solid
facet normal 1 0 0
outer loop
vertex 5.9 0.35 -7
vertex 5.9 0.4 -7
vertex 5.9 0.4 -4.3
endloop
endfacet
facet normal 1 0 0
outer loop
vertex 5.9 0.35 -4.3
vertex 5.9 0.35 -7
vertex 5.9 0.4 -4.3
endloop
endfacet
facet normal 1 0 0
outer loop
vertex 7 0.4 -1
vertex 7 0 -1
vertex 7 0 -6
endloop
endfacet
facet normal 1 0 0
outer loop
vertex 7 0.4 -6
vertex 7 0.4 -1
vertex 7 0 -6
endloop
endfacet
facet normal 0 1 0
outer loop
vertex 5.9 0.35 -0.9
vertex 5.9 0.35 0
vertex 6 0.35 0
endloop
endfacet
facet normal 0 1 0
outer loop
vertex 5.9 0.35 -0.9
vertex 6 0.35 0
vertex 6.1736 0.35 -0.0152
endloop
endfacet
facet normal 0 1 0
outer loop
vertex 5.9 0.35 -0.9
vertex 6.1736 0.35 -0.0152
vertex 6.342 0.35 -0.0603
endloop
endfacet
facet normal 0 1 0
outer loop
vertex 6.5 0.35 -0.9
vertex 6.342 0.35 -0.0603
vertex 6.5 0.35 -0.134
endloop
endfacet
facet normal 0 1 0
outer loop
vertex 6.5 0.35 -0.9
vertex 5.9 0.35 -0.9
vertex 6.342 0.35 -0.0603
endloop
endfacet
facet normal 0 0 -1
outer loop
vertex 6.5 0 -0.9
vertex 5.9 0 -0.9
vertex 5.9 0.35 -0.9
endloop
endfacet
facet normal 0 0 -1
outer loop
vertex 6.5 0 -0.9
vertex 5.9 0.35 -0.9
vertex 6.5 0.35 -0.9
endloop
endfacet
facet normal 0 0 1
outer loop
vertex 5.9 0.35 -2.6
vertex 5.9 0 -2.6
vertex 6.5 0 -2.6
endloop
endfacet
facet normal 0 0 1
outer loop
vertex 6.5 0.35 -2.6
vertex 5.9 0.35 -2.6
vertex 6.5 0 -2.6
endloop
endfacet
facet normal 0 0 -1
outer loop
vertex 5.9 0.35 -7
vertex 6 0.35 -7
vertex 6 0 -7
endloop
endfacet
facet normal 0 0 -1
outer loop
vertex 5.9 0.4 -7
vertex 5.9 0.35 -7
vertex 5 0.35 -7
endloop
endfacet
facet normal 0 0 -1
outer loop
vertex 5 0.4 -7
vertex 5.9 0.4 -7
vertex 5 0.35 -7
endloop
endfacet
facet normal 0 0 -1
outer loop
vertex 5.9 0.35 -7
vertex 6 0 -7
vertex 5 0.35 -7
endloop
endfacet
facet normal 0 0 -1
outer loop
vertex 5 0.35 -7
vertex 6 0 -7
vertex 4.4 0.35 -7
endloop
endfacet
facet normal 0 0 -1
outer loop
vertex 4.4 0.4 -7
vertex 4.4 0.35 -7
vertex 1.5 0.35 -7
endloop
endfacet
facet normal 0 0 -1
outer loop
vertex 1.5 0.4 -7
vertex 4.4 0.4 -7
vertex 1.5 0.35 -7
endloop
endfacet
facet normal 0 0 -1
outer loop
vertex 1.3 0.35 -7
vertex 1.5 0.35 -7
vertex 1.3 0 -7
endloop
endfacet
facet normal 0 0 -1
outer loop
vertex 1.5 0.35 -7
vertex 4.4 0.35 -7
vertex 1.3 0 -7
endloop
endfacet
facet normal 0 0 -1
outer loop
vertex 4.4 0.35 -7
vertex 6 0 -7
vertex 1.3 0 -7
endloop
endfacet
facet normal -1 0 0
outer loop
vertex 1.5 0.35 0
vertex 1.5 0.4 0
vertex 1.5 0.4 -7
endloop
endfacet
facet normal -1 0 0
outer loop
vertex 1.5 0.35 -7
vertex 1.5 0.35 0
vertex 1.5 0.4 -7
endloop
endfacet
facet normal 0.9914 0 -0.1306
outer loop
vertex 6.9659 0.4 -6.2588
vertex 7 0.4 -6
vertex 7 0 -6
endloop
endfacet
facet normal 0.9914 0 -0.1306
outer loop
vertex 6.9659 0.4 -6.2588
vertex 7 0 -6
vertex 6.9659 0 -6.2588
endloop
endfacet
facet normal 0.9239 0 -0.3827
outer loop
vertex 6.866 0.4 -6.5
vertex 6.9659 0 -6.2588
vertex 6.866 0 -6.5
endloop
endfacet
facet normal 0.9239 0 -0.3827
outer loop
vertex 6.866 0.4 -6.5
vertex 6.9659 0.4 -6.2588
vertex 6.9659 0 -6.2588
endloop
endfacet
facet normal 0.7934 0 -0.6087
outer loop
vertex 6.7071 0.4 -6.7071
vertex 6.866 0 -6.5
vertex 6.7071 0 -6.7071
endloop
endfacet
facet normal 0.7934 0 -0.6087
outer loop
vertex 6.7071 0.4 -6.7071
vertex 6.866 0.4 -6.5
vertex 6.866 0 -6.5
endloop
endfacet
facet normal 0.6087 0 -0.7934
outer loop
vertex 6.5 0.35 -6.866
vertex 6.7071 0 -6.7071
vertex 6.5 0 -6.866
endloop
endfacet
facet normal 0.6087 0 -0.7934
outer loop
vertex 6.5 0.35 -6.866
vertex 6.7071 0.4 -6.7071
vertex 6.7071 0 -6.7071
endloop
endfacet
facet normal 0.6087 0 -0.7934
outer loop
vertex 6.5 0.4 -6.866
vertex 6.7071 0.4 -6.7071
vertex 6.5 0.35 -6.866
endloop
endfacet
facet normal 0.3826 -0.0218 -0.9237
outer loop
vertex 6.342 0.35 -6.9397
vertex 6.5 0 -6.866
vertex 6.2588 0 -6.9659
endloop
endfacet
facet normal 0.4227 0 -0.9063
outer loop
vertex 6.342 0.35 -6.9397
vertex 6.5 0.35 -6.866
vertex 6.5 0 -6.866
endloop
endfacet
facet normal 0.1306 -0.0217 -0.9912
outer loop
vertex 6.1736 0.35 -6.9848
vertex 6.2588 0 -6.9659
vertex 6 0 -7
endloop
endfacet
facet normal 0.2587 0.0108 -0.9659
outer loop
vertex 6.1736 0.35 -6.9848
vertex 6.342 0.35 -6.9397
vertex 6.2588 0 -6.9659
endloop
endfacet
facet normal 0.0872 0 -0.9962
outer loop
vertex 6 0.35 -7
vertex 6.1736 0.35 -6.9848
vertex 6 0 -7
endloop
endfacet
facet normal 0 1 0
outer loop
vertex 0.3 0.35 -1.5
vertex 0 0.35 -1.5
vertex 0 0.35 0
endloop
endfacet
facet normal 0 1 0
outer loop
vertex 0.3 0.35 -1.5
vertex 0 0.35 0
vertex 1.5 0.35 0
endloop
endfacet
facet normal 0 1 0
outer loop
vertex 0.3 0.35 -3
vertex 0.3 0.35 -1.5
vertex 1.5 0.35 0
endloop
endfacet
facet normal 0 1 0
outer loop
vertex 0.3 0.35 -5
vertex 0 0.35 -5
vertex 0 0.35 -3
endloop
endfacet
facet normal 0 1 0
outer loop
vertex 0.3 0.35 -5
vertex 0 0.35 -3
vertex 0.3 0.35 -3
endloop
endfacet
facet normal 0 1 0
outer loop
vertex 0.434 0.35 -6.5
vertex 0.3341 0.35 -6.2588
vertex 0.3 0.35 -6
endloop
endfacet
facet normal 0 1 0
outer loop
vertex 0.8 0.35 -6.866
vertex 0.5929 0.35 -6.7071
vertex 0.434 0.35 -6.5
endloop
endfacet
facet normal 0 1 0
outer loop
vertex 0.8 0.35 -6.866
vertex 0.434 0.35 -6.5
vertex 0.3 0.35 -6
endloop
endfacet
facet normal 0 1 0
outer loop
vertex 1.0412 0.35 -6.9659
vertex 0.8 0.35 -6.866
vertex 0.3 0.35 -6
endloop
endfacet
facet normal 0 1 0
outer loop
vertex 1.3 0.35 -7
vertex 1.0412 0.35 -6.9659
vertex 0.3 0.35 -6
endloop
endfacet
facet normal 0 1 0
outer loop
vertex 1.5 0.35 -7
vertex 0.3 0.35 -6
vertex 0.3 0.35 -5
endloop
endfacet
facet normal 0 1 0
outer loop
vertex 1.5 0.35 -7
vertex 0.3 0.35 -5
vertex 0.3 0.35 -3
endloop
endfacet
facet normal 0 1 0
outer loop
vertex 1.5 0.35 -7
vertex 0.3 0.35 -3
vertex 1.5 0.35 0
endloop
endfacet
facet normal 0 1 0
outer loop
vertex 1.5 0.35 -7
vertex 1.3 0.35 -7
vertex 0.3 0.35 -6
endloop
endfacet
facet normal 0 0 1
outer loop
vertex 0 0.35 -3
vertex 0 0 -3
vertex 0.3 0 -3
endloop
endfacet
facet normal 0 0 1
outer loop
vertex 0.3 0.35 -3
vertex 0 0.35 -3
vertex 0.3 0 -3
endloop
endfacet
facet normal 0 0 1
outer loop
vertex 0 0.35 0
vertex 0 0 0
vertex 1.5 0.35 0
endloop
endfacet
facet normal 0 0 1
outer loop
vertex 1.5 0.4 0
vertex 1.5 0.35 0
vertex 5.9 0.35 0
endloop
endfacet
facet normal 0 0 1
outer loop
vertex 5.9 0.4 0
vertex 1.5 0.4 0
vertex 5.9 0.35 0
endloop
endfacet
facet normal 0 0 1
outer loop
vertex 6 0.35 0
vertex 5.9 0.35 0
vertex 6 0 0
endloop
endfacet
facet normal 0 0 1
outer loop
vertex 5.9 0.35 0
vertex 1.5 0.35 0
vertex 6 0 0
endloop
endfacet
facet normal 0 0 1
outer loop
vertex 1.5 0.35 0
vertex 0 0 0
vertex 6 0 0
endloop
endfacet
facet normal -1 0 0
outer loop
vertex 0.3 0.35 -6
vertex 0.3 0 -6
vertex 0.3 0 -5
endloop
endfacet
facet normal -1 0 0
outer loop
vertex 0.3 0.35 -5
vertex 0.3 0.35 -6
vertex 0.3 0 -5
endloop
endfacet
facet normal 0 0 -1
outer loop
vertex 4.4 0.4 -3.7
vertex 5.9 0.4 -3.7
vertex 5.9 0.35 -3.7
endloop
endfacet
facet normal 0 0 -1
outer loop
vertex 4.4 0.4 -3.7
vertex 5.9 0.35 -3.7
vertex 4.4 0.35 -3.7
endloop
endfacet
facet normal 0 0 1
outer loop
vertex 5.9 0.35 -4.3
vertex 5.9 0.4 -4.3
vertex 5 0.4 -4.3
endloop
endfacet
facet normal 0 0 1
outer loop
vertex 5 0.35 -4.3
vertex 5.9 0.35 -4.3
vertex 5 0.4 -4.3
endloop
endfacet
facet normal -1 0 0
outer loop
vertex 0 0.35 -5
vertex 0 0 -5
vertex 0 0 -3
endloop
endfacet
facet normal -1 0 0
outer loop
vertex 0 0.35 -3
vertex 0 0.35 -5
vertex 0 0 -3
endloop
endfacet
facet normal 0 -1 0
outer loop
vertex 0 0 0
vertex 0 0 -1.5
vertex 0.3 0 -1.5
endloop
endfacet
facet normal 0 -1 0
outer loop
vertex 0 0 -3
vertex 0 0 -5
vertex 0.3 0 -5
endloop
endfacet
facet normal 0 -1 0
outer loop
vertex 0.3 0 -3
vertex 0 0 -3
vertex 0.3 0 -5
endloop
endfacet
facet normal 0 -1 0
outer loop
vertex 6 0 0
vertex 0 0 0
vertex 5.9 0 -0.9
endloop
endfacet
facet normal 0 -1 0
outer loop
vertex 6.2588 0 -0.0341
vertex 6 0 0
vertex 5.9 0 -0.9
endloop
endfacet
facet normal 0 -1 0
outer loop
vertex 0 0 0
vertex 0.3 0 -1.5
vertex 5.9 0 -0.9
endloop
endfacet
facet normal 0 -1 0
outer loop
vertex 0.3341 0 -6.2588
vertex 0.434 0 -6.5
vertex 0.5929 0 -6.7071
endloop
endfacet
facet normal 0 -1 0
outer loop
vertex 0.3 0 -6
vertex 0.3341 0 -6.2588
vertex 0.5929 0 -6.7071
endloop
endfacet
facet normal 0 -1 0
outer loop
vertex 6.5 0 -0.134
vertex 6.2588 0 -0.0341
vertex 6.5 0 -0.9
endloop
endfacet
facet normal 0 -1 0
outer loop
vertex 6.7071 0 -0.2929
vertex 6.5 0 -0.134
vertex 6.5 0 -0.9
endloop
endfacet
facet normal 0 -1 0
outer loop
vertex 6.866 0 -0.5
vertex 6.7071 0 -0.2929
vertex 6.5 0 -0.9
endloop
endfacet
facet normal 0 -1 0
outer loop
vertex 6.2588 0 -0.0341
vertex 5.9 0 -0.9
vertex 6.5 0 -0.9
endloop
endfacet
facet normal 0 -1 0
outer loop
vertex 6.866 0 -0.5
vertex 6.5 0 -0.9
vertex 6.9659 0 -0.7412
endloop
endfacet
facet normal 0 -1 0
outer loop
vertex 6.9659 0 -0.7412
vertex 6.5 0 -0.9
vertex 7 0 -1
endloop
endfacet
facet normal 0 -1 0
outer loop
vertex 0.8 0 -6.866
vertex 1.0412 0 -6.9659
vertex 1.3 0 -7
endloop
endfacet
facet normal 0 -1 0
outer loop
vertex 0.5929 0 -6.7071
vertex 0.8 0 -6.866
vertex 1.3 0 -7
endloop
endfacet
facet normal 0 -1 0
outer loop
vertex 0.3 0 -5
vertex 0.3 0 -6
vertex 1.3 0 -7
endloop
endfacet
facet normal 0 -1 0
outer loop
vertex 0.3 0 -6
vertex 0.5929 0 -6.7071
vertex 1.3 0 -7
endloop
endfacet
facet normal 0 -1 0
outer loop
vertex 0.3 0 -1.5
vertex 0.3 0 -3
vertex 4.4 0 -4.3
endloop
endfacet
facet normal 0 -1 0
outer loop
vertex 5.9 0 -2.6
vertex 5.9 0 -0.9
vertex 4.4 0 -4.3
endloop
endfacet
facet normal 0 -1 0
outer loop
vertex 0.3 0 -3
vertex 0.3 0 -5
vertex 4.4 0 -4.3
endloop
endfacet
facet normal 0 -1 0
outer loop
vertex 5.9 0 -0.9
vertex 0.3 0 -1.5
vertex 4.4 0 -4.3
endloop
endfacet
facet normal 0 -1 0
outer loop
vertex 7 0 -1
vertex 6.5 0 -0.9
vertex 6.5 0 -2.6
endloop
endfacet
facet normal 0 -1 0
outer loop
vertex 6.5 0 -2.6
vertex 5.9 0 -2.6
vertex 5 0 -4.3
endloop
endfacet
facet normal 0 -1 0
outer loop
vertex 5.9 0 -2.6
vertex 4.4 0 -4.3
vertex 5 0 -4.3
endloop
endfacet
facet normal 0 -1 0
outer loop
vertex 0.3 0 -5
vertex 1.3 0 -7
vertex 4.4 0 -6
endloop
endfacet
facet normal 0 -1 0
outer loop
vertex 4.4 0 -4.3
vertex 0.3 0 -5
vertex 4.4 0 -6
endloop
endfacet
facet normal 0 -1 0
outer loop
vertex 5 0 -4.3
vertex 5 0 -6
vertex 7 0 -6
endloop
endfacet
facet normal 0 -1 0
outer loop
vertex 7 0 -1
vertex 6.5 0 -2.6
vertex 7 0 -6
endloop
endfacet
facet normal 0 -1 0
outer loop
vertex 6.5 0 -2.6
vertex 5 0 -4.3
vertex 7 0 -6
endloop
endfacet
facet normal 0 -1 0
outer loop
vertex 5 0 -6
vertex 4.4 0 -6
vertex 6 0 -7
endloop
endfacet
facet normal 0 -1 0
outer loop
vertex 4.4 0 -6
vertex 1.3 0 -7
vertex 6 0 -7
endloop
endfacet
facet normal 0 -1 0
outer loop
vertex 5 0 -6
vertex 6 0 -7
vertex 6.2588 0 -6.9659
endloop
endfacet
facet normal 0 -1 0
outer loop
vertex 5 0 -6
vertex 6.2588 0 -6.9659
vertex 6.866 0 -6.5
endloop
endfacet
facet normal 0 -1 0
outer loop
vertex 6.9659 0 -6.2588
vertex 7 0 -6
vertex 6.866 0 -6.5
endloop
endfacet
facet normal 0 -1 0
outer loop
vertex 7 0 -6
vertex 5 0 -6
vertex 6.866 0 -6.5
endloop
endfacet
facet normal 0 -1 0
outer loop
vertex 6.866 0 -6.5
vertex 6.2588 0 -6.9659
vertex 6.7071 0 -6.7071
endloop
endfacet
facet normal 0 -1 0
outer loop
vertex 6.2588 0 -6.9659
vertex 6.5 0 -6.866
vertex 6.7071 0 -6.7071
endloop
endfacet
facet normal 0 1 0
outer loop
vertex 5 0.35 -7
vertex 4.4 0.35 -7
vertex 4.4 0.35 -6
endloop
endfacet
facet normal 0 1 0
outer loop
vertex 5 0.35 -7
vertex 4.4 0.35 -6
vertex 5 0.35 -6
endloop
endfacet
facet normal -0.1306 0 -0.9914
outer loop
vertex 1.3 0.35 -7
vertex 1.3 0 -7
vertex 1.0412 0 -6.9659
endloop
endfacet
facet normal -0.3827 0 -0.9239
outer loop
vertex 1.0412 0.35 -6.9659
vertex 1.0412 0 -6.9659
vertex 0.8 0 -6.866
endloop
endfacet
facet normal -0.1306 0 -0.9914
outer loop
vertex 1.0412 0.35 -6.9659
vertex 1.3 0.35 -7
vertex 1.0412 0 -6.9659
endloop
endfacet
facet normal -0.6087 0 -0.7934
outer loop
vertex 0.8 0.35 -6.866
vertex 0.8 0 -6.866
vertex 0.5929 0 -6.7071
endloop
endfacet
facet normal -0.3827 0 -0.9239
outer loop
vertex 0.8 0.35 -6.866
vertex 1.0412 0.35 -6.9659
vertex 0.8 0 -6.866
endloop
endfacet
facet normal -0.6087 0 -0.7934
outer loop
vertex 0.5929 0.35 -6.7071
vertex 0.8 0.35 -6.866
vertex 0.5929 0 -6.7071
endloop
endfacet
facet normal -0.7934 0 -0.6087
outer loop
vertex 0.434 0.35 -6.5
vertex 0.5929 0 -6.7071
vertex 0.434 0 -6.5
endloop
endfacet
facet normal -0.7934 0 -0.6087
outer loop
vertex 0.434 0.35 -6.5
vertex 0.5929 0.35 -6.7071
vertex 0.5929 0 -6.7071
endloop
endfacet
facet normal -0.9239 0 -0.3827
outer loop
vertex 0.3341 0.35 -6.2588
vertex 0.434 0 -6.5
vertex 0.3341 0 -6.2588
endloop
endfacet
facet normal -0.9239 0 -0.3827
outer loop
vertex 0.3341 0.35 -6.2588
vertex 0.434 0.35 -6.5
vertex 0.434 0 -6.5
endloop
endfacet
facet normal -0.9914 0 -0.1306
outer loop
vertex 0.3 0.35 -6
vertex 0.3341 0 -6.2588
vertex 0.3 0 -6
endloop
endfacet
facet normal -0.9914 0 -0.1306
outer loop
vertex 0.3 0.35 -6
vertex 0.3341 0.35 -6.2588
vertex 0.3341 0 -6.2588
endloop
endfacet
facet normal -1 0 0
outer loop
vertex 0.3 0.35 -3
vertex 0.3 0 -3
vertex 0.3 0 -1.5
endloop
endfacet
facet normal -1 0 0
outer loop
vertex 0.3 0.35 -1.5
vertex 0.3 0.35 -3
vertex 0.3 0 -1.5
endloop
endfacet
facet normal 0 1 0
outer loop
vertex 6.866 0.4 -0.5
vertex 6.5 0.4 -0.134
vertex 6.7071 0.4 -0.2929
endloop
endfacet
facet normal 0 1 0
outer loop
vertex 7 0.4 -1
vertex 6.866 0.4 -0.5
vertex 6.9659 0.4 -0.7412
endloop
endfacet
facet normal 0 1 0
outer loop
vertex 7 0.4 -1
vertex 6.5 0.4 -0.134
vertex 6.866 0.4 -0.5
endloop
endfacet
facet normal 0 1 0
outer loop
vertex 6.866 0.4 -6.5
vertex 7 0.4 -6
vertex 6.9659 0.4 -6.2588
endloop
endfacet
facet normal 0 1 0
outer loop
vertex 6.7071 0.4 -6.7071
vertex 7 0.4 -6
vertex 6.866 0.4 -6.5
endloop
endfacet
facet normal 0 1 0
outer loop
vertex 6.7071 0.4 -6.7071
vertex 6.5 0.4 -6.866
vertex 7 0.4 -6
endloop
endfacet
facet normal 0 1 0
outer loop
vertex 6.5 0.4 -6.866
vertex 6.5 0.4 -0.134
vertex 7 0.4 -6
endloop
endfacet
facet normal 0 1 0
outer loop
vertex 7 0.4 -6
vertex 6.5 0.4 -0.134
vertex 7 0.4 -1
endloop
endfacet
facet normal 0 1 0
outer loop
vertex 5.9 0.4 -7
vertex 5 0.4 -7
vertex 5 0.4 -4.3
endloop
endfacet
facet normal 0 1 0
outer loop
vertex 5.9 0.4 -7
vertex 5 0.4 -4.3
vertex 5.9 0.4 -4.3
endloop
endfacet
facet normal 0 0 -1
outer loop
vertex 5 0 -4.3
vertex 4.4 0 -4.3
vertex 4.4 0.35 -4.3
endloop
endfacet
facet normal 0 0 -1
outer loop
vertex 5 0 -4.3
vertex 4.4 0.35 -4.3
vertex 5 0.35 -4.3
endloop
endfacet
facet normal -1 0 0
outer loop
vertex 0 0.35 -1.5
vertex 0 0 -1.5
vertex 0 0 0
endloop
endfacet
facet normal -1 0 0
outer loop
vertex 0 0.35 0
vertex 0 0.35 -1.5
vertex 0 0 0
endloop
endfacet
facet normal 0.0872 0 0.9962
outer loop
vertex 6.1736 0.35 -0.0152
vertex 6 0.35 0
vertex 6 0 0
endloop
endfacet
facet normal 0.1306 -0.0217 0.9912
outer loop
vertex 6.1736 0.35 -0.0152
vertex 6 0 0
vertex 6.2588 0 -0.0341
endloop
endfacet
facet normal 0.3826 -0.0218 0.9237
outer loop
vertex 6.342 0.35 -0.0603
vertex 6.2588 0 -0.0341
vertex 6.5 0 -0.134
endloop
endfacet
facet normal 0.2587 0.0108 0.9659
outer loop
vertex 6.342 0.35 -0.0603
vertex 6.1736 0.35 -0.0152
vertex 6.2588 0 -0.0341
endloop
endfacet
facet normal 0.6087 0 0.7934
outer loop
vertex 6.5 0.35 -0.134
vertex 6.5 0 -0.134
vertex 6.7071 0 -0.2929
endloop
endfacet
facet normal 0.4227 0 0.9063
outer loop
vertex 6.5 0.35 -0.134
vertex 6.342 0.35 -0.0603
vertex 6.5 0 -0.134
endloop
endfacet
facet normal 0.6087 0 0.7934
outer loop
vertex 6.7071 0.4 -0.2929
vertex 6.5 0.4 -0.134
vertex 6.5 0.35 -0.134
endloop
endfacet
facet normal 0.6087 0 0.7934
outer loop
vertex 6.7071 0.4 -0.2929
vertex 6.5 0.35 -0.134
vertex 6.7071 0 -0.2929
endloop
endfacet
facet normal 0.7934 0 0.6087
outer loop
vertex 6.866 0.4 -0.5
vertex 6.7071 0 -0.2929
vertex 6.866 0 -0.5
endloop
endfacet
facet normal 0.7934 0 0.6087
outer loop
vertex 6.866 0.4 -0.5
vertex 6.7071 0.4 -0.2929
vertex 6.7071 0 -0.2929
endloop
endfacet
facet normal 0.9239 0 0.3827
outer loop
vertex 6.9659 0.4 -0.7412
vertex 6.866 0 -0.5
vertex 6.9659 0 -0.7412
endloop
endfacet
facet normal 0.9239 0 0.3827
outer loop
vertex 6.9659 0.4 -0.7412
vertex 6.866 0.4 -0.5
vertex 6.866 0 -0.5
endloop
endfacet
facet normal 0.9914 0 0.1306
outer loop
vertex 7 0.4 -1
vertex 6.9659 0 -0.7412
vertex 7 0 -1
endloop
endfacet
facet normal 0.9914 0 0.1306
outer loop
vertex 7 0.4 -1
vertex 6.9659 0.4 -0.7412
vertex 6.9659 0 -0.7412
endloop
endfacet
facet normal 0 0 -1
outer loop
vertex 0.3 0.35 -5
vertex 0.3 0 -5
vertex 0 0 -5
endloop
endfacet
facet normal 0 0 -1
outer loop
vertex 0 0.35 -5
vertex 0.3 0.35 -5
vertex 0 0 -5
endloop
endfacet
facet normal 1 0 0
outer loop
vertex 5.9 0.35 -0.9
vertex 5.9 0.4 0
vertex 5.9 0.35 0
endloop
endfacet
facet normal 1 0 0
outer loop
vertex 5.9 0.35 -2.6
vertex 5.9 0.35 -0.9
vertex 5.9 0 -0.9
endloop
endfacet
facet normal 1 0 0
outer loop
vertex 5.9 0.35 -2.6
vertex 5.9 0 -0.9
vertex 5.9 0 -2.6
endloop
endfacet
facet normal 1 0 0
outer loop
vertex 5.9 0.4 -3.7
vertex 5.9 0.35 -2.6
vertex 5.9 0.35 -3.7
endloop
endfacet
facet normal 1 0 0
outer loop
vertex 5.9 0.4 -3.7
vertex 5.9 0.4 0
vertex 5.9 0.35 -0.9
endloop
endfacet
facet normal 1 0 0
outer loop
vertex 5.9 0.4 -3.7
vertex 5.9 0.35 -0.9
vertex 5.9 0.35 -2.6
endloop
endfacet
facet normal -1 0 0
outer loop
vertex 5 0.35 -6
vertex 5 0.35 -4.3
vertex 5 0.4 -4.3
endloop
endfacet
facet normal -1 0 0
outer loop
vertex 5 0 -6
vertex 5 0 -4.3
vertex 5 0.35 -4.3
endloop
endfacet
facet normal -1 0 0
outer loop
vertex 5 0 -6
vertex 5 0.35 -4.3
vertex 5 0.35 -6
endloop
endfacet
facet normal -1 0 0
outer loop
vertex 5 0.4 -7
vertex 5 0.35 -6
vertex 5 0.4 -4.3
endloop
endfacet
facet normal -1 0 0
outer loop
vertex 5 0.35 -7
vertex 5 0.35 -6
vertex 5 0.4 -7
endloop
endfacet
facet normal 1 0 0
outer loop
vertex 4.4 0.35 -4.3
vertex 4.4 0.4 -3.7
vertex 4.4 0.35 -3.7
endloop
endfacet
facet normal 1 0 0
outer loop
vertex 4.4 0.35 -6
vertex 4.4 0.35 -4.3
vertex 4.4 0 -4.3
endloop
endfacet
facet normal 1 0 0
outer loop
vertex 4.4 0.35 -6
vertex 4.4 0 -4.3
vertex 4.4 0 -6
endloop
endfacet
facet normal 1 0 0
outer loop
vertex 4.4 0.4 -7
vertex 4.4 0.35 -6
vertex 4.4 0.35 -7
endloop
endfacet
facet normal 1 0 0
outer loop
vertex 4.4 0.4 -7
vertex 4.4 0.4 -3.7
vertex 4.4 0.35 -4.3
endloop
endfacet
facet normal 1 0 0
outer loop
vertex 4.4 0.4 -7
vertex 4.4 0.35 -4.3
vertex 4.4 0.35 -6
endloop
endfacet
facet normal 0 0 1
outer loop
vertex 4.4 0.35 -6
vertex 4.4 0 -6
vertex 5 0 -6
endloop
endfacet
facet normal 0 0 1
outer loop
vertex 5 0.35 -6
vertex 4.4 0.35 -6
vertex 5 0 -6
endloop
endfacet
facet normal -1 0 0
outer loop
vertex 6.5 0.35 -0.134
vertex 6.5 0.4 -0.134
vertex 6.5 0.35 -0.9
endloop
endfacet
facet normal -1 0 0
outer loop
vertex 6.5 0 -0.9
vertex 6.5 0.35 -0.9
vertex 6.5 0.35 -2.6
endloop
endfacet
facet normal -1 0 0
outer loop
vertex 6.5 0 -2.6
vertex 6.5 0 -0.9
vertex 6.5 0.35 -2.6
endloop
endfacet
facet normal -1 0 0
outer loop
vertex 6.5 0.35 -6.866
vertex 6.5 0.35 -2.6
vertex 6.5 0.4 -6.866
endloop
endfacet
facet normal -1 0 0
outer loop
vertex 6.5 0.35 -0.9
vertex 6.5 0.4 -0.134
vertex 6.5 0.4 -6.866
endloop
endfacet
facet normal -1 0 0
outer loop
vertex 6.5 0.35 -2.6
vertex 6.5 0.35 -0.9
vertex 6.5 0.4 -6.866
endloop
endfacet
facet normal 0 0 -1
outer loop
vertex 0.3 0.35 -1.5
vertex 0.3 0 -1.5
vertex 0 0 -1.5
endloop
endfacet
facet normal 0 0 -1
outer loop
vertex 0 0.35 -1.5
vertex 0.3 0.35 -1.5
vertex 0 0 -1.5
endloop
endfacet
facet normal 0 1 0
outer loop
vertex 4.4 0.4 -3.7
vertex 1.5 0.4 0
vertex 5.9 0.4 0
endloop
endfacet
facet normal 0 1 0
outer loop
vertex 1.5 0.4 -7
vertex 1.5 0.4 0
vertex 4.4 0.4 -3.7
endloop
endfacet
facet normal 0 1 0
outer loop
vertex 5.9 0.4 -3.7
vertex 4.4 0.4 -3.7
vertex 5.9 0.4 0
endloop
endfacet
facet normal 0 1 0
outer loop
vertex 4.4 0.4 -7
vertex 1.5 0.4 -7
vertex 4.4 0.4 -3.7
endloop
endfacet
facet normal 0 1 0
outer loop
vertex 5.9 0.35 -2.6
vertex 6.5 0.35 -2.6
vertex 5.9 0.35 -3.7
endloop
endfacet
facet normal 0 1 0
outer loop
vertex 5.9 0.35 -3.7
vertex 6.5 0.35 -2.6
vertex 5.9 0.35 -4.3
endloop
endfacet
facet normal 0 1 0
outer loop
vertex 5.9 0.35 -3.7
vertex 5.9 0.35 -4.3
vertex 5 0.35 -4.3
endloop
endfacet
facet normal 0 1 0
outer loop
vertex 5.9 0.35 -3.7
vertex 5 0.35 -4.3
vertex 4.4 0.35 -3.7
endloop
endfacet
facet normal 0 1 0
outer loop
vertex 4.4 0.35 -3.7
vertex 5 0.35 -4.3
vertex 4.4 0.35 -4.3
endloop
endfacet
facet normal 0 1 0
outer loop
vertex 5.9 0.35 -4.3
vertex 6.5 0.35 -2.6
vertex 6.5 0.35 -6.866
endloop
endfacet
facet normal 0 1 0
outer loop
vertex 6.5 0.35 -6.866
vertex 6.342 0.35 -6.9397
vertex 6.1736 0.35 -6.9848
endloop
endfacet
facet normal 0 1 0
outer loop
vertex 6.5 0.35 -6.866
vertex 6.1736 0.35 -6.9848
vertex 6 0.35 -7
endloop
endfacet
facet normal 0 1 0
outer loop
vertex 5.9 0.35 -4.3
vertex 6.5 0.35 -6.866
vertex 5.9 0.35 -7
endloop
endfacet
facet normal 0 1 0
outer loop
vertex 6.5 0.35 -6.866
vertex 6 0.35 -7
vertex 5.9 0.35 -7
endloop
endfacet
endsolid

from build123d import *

# Parameters (mm, degrees)
SKETCH1_W           = 0.6
SKETCH1_H           = 1.7
BOSS_EXTRUDE1_DEPTH = 0.4
FILLET1_R           = 1
SKETCH3_W           = 0.6
SKETCH3_H           = 0.9
SKETCH3_H_2         = 1
CUT_EXTRUDE2_DEPTH  = 0.05


with BuildPart() as part:
    # Sketch1 → Boss-Extrude1 (new body)
    with BuildSketch(Plane(origin=(0, 0, 0), x_dir=(1, 0, 0), z_dir=(0, 1, 0))):
        Polygon((0, 0), (7, 0), (7, 7), (0.3, 7), (0.3, 5), (0, 5), (0, 3), (0.3, 3), (0.3, 1.5), (0, 1.5), align=None)
        with Locations((4.7, 5.15)):
            Rectangle(SKETCH1_W, SKETCH1_H, mode=Mode.SUBTRACT)
        with Locations((6.2, 1.75)):
            Rectangle(SKETCH1_W, SKETCH1_H, mode=Mode.SUBTRACT)
    extrude(amount=BOSS_EXTRUDE1_DEPTH)

    # Fillet1
    fillet1_edges = [part.edges().sort_by_distance(p)[0] for p in [
        (0.3, 0.2, -7),
        (7, 0.2, -7),
        (7, 0.2, 0),
    ]]
    fillet(fillet1_edges, radius=FILLET1_R)

    # Sketch3 → Cut-Extrude2 (cut)
    with BuildSketch(Plane(origin=(0, 0.4, 0), x_dir=(1, 0, 0), z_dir=(0, 1, 0))):
        with BuildLine():
            Line((1.5, 0), (1.5, 7))
            Line((1.5, 7), (1.3, 7))
            ThreePointArc((1.3, 7), (0.592893219, 6.707106781), (0.3, 6))
            Line((0.3, 6), (0.3, 5))
            Line((0.3, 5), (0, 5))
            Line((0, 5), (0, 3))
            Line((0, 3), (0.3, 3))
            Line((0.3, 3), (0.3, 1.5))
            Line((0.3, 1.5), (0, 1.5))
            Line((0, 1.5), (0, 0))
            Line((0, 0), (1.5, 0))
        make_face()
        with Locations((6.2, 0.45)):
            Rectangle(SKETCH3_W, SKETCH3_H)
        Polygon((4.4, 4.3), (5, 4.3), (5.9, 4.3), (5.9, 7), (5.9, 7.268876882), (6.5, 7.268876882), (6.5, 7), (6.5, 4.3), (6.5, 3.7), (6.5, 2.6), (5.9, 2.6), (5.9, 3.7), (4.4, 3.7), align=None)
        with Locations((4.7, 6.5)):
            Rectangle(SKETCH3_W, SKETCH3_H_2)
    extrude(amount=-CUT_EXTRUDE2_DEPTH, mode=Mode.SUBTRACT)


solid = part.part
